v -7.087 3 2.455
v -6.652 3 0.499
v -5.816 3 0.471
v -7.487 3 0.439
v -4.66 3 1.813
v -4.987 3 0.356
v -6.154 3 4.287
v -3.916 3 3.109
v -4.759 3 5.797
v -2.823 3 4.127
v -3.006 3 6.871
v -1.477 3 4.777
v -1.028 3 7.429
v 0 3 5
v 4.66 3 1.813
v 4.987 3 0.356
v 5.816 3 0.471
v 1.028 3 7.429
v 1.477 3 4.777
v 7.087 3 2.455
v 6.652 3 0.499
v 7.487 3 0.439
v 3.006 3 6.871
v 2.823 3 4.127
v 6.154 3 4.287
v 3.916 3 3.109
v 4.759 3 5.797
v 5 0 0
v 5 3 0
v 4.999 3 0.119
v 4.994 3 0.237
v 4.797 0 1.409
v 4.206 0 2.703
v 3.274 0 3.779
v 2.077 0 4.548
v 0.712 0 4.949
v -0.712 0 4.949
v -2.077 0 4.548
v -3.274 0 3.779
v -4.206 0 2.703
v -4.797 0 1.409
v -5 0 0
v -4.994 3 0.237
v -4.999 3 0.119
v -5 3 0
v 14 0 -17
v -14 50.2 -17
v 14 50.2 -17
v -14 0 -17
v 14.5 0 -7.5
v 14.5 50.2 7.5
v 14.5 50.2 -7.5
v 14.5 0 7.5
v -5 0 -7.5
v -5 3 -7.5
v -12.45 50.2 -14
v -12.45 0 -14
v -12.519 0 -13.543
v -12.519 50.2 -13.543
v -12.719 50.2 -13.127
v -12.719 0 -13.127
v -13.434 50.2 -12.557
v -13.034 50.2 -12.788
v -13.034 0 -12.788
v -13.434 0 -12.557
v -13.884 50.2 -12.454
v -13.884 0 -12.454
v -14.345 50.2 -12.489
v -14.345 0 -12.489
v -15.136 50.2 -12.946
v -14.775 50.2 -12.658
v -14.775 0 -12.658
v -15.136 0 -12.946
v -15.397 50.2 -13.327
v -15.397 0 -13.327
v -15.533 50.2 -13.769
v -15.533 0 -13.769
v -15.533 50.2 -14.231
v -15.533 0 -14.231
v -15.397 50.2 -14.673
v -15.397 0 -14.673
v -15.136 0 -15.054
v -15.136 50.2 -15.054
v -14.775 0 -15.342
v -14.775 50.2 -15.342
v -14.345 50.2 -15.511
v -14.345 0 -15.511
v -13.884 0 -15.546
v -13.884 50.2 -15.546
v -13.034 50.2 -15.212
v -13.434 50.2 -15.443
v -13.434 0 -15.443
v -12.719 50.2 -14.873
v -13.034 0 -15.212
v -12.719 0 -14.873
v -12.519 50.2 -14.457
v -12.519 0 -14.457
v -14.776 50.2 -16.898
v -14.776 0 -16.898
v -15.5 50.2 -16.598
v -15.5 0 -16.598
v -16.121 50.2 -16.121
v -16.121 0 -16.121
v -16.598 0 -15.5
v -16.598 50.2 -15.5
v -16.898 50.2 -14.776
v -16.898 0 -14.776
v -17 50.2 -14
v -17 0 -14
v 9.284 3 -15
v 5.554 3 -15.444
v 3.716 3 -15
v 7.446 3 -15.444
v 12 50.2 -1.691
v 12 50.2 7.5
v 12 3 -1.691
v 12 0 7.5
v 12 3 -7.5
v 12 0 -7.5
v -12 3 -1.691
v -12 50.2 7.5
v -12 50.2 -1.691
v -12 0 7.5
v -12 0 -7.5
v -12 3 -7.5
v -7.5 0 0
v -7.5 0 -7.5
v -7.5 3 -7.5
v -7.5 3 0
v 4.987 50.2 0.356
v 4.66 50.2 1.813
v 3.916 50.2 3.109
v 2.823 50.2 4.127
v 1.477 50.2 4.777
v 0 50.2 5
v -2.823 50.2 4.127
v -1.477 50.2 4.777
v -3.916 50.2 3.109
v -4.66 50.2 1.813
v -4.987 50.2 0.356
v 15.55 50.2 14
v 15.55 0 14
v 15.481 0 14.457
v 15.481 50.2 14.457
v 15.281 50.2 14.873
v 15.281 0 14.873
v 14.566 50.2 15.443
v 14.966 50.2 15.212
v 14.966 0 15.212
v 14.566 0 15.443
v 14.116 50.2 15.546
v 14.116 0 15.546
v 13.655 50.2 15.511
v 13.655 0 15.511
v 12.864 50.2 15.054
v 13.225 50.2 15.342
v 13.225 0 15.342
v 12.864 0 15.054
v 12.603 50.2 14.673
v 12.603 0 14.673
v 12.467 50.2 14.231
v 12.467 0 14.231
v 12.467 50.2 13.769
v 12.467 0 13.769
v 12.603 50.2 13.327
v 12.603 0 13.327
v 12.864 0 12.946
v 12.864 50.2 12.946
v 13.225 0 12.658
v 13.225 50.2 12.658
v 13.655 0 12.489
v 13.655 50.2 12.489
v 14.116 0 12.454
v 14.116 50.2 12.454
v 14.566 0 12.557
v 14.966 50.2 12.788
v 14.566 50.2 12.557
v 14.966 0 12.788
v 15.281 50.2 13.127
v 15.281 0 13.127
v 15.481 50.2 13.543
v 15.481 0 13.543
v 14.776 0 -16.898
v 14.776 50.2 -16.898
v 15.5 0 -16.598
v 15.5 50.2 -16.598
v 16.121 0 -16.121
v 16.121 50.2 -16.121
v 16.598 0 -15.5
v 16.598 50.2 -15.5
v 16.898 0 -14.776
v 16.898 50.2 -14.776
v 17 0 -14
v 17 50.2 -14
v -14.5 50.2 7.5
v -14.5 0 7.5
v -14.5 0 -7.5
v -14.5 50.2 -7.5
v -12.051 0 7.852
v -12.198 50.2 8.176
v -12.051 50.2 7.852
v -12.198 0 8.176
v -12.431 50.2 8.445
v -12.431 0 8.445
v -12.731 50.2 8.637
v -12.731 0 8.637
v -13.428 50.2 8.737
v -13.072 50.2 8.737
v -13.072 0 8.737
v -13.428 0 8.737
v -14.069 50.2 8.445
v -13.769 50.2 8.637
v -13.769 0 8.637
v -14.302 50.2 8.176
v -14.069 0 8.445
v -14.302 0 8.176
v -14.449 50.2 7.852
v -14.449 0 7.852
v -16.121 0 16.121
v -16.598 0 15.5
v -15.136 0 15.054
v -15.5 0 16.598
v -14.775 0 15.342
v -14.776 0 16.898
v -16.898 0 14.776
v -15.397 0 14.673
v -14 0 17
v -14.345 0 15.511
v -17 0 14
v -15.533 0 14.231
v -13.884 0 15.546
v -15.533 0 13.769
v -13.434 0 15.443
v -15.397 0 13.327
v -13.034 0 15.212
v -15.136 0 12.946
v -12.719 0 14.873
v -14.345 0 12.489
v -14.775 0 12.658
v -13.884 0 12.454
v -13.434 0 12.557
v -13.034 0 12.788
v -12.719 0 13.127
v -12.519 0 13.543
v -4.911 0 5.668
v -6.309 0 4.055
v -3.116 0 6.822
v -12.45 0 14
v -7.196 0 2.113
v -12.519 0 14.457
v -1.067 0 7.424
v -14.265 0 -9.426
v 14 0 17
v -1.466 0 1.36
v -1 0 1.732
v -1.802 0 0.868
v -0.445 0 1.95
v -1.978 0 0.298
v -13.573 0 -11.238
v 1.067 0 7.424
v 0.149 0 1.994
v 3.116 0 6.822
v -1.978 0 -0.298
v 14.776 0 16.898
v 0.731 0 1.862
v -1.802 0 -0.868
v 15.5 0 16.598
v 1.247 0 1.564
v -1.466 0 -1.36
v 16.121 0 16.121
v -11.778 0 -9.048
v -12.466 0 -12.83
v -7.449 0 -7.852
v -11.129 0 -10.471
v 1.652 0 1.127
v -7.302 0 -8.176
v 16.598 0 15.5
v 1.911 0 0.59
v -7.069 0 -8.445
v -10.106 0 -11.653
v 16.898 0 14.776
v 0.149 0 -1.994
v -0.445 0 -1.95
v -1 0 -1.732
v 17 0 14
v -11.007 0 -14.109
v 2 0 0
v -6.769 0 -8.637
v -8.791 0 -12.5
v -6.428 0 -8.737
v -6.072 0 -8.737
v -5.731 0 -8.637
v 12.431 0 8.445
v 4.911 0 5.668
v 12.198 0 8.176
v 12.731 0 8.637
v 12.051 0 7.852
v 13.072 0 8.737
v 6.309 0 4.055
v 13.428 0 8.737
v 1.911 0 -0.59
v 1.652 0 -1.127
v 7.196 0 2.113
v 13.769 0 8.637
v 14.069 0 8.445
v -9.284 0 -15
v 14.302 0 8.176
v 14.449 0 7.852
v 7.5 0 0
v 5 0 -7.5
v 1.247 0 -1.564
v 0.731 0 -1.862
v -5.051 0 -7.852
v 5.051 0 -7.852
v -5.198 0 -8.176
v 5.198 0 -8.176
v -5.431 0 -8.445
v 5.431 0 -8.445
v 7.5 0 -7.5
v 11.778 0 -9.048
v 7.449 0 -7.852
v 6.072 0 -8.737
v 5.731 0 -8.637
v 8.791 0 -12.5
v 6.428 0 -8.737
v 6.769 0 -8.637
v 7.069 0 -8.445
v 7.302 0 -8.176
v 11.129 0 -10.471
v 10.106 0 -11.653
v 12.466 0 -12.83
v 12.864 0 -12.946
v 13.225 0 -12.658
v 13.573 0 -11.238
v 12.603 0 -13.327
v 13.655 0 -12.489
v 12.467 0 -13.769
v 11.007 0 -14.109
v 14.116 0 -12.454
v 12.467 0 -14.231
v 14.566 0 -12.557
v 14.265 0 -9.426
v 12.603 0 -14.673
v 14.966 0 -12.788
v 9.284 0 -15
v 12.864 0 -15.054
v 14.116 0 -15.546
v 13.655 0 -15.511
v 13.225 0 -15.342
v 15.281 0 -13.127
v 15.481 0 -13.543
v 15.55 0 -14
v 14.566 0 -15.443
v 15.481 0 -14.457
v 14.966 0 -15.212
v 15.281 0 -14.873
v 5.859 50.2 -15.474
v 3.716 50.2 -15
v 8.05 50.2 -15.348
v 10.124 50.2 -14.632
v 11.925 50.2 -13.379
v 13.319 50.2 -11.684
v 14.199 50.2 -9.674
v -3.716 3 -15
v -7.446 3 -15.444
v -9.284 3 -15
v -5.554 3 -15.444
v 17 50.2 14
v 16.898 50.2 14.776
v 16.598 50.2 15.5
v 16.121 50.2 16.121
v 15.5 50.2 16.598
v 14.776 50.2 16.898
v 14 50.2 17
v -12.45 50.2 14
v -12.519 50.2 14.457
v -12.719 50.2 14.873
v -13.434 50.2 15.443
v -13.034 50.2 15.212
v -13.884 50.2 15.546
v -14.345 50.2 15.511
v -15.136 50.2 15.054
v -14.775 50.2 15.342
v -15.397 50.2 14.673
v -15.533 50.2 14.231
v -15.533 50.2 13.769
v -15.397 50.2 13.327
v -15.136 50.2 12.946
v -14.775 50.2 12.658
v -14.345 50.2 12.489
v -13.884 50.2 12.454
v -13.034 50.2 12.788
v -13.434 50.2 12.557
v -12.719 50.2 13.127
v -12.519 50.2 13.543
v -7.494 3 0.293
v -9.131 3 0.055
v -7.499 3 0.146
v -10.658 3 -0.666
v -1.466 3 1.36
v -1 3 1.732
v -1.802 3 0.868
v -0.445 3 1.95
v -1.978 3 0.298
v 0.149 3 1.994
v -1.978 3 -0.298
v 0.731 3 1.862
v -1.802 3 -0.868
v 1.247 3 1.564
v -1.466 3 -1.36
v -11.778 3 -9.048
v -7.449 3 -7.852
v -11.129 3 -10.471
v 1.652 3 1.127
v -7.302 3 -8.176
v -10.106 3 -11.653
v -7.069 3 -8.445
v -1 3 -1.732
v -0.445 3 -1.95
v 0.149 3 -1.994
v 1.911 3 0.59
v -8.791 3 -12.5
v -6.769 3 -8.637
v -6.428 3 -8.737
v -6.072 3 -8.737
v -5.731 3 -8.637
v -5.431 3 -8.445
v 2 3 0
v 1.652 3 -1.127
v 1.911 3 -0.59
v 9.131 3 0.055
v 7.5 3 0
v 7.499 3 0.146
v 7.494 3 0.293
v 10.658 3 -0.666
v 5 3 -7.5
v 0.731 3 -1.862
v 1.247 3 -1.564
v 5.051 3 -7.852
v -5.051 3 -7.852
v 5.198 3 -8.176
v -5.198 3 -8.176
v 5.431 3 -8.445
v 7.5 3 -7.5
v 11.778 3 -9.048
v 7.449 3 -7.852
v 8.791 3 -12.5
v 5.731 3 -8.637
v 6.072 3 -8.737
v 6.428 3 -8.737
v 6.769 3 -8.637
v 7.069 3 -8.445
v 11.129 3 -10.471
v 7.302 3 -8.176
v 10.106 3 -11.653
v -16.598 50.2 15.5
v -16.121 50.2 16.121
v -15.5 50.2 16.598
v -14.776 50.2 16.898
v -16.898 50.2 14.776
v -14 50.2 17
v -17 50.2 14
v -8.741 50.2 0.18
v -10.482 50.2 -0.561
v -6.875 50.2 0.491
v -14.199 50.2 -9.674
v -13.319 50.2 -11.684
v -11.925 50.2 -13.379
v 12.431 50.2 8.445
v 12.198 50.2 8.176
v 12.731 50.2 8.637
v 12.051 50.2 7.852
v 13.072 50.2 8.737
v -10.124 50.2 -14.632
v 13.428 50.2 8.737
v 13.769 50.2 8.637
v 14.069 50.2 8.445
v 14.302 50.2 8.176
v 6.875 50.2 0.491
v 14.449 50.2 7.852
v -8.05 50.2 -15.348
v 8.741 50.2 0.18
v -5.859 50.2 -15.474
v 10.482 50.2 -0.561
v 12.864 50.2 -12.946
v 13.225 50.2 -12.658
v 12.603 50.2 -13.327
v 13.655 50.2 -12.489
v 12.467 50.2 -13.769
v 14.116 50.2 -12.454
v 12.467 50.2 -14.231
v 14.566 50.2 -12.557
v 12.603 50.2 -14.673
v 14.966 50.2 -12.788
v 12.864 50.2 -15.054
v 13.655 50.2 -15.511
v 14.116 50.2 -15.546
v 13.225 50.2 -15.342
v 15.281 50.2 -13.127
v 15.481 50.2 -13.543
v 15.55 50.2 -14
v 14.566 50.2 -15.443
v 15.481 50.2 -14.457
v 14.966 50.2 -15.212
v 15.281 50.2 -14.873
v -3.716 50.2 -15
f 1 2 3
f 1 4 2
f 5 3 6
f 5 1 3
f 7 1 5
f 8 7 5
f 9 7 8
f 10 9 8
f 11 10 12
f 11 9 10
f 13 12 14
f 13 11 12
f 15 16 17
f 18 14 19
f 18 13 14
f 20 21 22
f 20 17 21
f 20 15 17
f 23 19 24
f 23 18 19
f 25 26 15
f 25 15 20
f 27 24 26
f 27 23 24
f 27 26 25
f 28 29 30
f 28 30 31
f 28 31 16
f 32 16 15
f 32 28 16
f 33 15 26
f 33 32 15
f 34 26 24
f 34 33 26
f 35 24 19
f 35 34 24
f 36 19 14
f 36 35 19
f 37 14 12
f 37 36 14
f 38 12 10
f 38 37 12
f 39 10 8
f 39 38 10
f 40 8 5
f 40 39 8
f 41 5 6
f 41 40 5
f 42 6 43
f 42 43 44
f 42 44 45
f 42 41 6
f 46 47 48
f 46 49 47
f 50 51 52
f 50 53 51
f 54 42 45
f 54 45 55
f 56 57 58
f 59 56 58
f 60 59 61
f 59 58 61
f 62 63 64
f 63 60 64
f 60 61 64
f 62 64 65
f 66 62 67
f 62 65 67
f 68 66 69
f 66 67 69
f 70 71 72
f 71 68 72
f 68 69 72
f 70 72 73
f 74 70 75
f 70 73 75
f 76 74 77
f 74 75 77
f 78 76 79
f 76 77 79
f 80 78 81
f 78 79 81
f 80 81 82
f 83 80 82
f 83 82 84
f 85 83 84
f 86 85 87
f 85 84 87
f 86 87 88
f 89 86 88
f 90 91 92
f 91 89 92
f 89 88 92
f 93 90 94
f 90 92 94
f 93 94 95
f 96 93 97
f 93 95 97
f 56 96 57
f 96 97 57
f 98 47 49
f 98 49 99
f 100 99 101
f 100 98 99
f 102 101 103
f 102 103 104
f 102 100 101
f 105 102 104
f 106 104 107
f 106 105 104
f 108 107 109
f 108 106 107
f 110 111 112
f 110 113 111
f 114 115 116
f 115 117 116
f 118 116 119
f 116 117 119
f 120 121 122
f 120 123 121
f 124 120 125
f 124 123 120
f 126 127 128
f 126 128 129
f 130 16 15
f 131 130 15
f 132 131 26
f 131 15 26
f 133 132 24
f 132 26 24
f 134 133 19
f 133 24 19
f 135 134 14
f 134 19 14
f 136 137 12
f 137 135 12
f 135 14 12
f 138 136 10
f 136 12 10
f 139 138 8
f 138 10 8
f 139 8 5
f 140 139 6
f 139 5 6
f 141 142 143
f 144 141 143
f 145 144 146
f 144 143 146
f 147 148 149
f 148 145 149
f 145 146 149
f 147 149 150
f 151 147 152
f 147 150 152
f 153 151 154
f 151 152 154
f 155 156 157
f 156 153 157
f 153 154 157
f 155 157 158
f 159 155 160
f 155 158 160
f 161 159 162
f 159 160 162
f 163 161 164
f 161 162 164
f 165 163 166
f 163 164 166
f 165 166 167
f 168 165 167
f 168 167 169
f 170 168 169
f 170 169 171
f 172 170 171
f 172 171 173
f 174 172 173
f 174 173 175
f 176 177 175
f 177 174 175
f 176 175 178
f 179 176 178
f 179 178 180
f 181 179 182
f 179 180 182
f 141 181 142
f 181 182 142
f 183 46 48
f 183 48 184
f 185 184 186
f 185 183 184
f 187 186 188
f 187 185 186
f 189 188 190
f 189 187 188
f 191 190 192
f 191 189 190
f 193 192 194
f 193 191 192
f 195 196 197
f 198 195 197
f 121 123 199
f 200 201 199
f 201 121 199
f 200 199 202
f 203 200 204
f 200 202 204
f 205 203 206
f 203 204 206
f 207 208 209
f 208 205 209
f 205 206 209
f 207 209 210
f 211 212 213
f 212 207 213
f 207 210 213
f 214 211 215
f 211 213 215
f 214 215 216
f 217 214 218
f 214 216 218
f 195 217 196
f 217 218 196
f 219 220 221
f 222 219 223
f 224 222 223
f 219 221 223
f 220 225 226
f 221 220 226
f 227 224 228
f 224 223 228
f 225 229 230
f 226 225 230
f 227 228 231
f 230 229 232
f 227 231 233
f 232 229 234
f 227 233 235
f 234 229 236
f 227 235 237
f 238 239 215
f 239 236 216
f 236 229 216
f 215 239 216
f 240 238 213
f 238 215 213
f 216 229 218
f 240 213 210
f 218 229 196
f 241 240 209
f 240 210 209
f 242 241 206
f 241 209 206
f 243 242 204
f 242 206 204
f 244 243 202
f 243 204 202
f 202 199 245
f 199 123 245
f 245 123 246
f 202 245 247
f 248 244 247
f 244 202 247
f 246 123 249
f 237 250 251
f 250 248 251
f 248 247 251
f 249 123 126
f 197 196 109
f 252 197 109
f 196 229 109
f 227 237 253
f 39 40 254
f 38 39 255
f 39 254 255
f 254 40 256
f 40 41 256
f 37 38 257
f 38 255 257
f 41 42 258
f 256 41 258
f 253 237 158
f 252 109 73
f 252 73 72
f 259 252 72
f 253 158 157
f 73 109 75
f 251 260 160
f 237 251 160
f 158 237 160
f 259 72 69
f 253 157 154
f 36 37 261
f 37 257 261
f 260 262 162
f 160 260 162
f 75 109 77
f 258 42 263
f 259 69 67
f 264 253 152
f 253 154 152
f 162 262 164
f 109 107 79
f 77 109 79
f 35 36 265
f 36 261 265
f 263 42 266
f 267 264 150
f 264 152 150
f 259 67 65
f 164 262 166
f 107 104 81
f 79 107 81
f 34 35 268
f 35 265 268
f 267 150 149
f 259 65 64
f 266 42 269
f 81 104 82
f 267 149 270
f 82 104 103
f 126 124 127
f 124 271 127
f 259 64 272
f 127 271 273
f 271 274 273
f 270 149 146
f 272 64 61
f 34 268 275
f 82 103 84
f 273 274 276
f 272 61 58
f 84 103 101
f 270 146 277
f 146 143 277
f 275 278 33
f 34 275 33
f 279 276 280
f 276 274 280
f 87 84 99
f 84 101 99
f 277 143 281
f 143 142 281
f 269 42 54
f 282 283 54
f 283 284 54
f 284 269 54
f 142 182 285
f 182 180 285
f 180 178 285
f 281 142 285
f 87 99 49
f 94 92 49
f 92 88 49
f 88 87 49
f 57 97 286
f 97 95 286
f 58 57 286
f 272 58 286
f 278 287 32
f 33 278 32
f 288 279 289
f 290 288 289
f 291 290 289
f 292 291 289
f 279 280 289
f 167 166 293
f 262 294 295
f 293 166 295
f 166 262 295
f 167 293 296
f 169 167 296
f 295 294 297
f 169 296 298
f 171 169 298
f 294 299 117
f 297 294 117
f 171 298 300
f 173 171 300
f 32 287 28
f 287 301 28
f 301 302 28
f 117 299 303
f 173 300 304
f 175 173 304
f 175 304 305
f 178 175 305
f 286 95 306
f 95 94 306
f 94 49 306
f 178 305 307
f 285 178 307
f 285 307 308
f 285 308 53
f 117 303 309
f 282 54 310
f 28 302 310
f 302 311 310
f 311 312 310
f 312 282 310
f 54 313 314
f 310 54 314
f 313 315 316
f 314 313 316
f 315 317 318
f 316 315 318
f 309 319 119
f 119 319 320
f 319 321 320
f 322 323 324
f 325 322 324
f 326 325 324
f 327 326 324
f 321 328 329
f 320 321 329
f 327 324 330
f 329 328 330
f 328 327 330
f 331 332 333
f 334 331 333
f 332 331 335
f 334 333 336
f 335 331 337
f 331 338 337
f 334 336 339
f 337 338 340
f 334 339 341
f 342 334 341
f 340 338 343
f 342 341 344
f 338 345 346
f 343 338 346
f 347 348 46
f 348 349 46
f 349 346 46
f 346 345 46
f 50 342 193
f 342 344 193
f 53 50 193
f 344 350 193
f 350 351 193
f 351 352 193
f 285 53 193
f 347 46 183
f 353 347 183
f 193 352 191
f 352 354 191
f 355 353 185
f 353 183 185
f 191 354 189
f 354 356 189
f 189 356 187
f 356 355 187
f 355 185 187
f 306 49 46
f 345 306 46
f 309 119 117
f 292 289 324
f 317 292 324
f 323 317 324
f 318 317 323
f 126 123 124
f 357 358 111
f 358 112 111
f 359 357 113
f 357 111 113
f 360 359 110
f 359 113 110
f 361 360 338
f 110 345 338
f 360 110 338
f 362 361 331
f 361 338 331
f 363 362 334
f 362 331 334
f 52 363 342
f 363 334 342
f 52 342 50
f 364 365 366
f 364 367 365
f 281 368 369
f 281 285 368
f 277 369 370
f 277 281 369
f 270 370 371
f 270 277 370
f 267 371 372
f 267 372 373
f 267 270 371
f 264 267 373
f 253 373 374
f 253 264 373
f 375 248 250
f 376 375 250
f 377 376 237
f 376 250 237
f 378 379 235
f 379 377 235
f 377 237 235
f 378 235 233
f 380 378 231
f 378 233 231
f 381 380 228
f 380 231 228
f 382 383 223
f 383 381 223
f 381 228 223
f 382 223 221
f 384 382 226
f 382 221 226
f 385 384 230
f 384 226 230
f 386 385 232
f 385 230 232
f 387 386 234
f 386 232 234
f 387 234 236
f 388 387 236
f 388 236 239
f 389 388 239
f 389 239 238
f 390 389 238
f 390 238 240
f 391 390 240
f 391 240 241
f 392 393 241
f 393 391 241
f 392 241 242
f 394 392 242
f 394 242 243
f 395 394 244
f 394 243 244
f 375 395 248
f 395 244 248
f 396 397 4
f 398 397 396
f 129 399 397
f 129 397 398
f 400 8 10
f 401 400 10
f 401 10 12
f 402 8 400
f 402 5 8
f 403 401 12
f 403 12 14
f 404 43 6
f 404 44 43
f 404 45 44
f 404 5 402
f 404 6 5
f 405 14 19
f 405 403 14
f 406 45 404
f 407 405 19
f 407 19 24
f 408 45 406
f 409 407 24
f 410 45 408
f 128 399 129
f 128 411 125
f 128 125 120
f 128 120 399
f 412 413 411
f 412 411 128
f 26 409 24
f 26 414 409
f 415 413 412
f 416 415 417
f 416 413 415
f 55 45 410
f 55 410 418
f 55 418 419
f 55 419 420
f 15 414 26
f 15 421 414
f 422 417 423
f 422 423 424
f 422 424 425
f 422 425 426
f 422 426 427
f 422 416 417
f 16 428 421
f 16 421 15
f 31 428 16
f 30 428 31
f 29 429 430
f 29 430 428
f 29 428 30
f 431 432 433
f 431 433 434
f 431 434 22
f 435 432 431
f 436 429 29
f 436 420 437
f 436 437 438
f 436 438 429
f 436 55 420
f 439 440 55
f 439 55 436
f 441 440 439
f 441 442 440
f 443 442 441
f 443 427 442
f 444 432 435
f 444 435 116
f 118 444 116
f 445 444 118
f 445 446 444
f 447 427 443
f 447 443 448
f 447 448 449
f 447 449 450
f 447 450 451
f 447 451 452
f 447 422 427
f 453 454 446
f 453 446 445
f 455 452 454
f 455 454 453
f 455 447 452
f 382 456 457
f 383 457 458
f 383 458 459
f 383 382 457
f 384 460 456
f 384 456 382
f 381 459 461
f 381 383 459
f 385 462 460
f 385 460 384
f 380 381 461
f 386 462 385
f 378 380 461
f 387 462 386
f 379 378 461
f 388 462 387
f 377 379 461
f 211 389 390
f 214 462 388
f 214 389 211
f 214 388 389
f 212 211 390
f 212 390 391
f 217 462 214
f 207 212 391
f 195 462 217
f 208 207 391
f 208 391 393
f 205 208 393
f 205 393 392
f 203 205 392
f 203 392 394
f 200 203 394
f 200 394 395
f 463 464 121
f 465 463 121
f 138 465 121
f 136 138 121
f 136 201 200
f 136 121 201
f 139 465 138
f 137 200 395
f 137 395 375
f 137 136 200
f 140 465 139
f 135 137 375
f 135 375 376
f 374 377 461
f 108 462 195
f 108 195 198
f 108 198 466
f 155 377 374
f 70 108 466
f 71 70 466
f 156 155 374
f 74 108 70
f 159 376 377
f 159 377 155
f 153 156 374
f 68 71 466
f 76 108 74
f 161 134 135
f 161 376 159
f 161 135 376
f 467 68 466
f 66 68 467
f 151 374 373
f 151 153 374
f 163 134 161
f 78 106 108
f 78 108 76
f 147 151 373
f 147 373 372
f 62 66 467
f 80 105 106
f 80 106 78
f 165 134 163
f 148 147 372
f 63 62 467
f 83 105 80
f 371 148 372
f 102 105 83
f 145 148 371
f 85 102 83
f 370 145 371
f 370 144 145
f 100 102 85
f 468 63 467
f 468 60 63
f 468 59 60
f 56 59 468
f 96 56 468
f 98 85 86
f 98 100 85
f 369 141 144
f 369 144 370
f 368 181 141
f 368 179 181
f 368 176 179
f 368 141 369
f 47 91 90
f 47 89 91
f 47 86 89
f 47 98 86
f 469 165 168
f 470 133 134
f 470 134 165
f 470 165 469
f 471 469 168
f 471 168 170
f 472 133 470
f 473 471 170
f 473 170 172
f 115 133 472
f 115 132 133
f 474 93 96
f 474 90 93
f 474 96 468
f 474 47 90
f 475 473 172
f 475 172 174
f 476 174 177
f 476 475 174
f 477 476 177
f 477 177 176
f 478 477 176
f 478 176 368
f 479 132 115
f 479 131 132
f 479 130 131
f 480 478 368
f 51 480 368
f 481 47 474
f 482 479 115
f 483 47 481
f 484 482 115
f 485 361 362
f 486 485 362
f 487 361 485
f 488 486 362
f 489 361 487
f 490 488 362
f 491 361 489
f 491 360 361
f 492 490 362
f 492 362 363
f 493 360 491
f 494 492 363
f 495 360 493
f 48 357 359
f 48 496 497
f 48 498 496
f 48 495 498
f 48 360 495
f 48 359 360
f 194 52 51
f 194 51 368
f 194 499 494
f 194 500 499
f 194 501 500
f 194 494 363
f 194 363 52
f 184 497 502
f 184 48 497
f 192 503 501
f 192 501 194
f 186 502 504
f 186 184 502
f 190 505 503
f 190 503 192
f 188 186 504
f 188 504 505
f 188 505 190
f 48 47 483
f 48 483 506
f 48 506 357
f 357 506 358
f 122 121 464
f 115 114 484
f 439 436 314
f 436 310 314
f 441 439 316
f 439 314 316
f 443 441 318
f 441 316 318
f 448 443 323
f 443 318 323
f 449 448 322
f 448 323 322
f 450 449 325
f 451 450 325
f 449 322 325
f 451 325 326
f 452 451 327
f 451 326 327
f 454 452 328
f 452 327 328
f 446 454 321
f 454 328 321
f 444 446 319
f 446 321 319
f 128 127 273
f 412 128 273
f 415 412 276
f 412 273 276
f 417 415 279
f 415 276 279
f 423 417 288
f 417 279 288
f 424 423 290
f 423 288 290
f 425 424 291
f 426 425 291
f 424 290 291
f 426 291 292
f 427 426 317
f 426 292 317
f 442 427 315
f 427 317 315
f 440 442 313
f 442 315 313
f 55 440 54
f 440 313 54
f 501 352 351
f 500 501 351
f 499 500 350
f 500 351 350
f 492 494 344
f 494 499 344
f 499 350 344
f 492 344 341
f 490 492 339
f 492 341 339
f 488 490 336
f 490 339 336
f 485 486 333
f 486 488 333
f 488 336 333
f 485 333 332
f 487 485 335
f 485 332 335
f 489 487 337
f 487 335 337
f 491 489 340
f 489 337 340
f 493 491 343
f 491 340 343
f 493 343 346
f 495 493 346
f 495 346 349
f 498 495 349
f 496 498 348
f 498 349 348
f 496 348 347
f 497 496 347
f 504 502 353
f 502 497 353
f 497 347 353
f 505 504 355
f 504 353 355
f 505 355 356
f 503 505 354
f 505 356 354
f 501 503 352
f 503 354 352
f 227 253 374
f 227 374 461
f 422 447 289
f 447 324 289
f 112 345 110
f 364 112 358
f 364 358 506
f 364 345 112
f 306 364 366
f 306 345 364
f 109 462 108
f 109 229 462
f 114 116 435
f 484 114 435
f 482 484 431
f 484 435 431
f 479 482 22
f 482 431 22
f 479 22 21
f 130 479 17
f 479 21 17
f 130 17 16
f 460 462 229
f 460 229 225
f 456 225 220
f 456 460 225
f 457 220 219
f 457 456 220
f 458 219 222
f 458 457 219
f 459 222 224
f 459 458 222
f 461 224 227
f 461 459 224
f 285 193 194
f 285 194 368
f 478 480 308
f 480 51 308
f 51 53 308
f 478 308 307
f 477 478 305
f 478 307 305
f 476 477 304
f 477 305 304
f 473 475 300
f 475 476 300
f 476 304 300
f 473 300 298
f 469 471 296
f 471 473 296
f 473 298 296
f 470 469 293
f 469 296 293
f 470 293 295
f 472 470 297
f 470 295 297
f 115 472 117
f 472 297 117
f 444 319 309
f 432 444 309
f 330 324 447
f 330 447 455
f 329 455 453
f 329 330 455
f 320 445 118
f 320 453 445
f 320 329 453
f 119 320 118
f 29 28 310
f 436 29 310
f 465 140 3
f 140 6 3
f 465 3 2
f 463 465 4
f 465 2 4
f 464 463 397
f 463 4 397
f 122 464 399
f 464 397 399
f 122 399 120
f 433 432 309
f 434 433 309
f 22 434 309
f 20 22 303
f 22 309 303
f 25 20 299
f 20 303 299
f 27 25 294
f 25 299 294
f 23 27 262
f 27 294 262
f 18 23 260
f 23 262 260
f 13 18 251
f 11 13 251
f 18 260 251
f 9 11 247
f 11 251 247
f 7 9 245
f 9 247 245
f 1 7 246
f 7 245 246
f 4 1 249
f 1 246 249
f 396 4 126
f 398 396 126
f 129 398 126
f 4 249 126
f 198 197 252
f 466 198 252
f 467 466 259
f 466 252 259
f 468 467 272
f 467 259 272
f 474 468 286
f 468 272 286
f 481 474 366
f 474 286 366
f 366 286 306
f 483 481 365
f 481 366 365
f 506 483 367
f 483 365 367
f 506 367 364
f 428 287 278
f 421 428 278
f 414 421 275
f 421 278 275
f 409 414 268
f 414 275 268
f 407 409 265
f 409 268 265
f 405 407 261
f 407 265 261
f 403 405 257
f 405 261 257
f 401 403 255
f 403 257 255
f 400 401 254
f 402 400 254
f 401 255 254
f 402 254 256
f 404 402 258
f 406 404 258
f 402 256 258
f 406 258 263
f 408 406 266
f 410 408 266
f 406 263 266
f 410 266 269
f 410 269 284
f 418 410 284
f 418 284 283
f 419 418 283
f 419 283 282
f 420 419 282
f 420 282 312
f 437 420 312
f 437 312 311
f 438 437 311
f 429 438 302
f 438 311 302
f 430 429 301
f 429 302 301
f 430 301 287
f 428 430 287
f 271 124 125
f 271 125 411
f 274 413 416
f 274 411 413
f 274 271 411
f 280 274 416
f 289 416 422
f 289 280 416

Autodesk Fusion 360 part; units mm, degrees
sketch "Skizze1" plane through (0, 0, 0) normal (0, 1, 0) x (1, 0, 0)
  circle A0 centre (0, 0) radius 7.1
  dimension "d1" = 14.2
extrude "Extrusion1" add sketch "Skizze1" along normal blind 50.2

Autodesk Fusion 360 part; units mm, degrees
sketch "Skizze1" plane through (0, 0, 0) normal (0, 1, 0) x (1, 0, 0)
  line L0 (-14.5, 9) -> (14.5, 9)
  line L1 (14.5, 9) -> (14.5, -9)
  line L2 (14.5, -9) -> (-14.5, -9)
  line L3 (-14.5, -9) -> (-14.5, 9)
  line L4 (0, 0) -> (0, 9) construction
  line L5 (0, 0) -> (14.5, 0) construction
  dimension "d1" = 29
  dimension "d2" = 18
extrude "Extrusion1" add sketch "Skizze1" along normal blind 4

Autodesk Fusion 360 part; units mm, degrees
sketch "Skizze1" plane through (0, 0, 0) normal (0, 1, 0) x (1, 0, 0)
  line L0 (-15.015, 0) -> (31.025, 0) construction
  line L1 (-15.015, 0) -> (-15.015, -7.62)
  line L2 (-15.015, -7.62) -> (15.015, -7.62)
  line L3 (15.015, -7.62) -> (16.625, -6.01)
  line L4 (16.625, -6.01) -> (31.025, -6.01)
  line L5 (31.025, -6.01) -> (31.025, 0)
  line L6 (-15.015, 0) -> (-15.015, 7.62)
  line L7 (-15.015, 7.62) -> (15.015, 7.62)
  line L8 (15.015, 7.62) -> (16.625, 6.01)
  line L9 (16.625, 6.01) -> (31.025, 6.01)
  line L10 (31.025, 6.01) -> (31.025, 0)
  line L11 (0, 0) -> (0, 7.62) construction
  dimension "d1" = 12.02
  dimension "d2" = 15.24
  dimension "d3" = 30.03
  dimension "d4" = 14.4
  dimension "d5" = 46.04
extrude "Extrusion1" add sketch "Skizze1" along normal blind 3

Autodesk Fusion 360 part; units mm, degrees
sketch "Skizze1" plane through (0, 0, 0) normal (0, 1, 0) x (1, 0, 0)
  line L0 (-17, 17) -> (17, 17)
  line L1 (17, 17) -> (17, -17)
  line L2 (17, -17) -> (-17, -17)
  line L3 (-17, -17) -> (-17, 17)
  line L4 (0, 0) -> (0, 17) construction
  line L5 (0, 0) -> (17, 0) construction
  circle A0 centre (0, 0) radius 2
  circle A1 centre (-14, 14) radius 1.55
  circle A2 centre (14, 14) radius 1.55
  circle A3 centre (-14, -14) radius 1.55
  circle A4 centre (14, -14) radius 1.55
  circle A5 centre (0, 0) radius 5
  circle A6 centre (-13.25, -7.5) radius 1.25
  line L6 (-12, -7.5) -> (-12, 7.5)
  line L7 (-14.5, -7.5) -> (-14.5, 7.5)
  circle A7 centre (-6.5, 7.5) radius 5.5
  circle A8 centre (-6.5, 7.5) radius 8
  line L8 (-9.2839, 15) -> (0, 15)
  line L9 (-8.7913, 12.5) -> (0, 12.5)
  circle A9 centre (6.5, 7.5) radius 8
  circle A10 centre (6.5, 7.5) radius 5.5
  line L10 (8.7913, 12.5) -> (0, 12.5)
  line L11 (9.2839, 15) -> (0, 15)
  line L12 (12, -7.5) -> (12, 7.5)
  line L13 (14.5, -7.5) -> (14.5, 7.5)
  circle A11 centre (13.25, -7.5) radius 1.25
  dimension "d1" = 34
  dimension "d7" = 4
  dimension "d11" = 3.1
  dimension "d12" = 28
  dimension "d13" = 28
  dimension "d14" = 10
  dimension "d17" = 2.5
  dimension "d18" = 2.5
  dimension "d20" = 16
  dimension "d21" = 11
  dimension "d22" = 9.5
  dimension "d23" = 2
  dimension "d24" = 2.5
  dimension "d28" = 9.5
extrude "Extrusion1" add sketch "Skizze1" along normal blind 3 contours L0 L1 L2 L3 | A0 A5 A8 A9 | A0 A5 A8 A9 A10 | A0 A5 A7 A8 A9 | A0 A8 A9 | A5 A9 A10 L12 | A5 L6 A7 A8 | A5 A8 A9 | A9 A10 L10 L11 L12 | A9 L12 L13 A11 | A5 A7 L9 A9 | A5 A7 | L6 A7 A8 L8 L9 | A6 L6 L7 A8 | A5 A8 A10 | A5 A7 A8 A9 A10 | A5 A7 A9 | A5 A10 | A5 A8 A10 L10 | A11 | A6 | A8 A10 | A7 A9 | A9 L11 | A10 L10 | A7 L9 | A8 L8 | A8 A9 A10 L10 | A7 A8 L9 A9 | A8 L8 L9 A9 L10 L11 | A8 L9 A9 L10 picked at (0.0445, 2.311)
fillet "Abrundung1" radius 3 4 edges at (-17, 1.5, -17) (-17, 1.5, 17) (17, 1.5, 17) (17, 1.5, -17)
extrude "Extrusion2" cut sketch "Skizze1" along normal up to surface (3 mm away) contours A9 A10 L10 L11 L12 | A9 L12 L13 A11 | L6 A7 A8 L8 L9 | A6 L6 L7 A8 | A11 | A6 | A10 L10 | A7 L9 | A8 L8 L9 A9 L10 L11
sketch "Skizze2" plane through (0, 0, 0) normal (0, -1, 0) x (1, 0, 0)
  arc A0 (-12, 7.5) -> (-14.5, 7.5) centre (-13.25, 7.5) ccw
  line L0 (-12, 7.5) -> (-12, -7.5)
  arc A1 (-12, -7.5) -> (-8.7913, -12.5) centre (-6.5, -7.5) ccw
  line L1 (-8.7913, -12.5) -> (8.7913, -12.5)
  arc A2 (8.7913, -12.5) -> (12, -7.5) centre (6.5, -7.5) ccw
  line L2 (12, -7.5) -> (12, 7.5)
  arc A3 (14.5, 7.5) -> (12, 7.5) centre (13.25, 7.5) ccw
  line L3 (14.5, 7.5) -> (14.5, -7.5)
  arc A4 (9.2839, -15) -> (14.5, -7.5) centre (6.5, -7.5) ccw
  line L4 (9.2839, -15) -> (-9.2839, -15)
  arc A5 (-14.5, -7.5) -> (-9.2839, -15) centre (-6.5, -7.5) ccw
  line L5 (-14.5, -7.5) -> (-14.5, 7.5)
  circle A6 centre (-14, 14) radius 1.55
  circle A7 centre (14, -14) radius 1.55
  circle A8 centre (14, 14) radius 1.55
  circle A9 centre (-14, -14) radius 1.55
  circle A10 centre (0, 0) radius 2
  arc A11 (14, -17) -> (17, -14) centre (14, -14) ccw
  line L6 (17, -14) -> (17, 14)
  arc A12 (17, 14) -> (14, 17) centre (14, 14) ccw
  line L7 (14, 17) -> (-14, 17)
  arc A13 (-14, 17) -> (-17, 14) centre (-14, 14) ccw
  line L8 (-17, 14) -> (-17, -14)
  arc A14 (-17, -14) -> (-14, -17) centre (-14, -14) ccw
  line L9 (-14, -17) -> (14, -17)
  circle A15 centre (0, 0) radius 5
  line L10 (0, 0) -> (0, -17) construction
  circle A16 centre (6.25, -7.5) radius 1.25
  line L11 (5, 0) -> (5, -7.5)
  line L12 (7.5, -7.5) -> (7.5, 0)
  circle A17 centre (0, 0) radius 7.5
  line L13 (0, 0) -> (7.5, 0) construction
  circle A18 centre (-6.25, -7.5) radius 1.25
  line L14 (-5, 0) -> (-5, -7.5)
  line L15 (-7.5, -7.5) -> (-7.5, 0)
  dimension "d31" = 2.5
  dimension "d32" = 10
  dimension "d33" = 7.5
extrude "Extrusion3" cut sketch "Skizze2" against normal up to surface (3 mm away) contours A15 L11 A17 L14 | A16 L11 L12 A17 | A17 A18 L14 L15 | A16 | A18 picked at (-4.6131, 4.7886)
equation "d13 = d12"
equation "d21 = d20 - 5 mm"
